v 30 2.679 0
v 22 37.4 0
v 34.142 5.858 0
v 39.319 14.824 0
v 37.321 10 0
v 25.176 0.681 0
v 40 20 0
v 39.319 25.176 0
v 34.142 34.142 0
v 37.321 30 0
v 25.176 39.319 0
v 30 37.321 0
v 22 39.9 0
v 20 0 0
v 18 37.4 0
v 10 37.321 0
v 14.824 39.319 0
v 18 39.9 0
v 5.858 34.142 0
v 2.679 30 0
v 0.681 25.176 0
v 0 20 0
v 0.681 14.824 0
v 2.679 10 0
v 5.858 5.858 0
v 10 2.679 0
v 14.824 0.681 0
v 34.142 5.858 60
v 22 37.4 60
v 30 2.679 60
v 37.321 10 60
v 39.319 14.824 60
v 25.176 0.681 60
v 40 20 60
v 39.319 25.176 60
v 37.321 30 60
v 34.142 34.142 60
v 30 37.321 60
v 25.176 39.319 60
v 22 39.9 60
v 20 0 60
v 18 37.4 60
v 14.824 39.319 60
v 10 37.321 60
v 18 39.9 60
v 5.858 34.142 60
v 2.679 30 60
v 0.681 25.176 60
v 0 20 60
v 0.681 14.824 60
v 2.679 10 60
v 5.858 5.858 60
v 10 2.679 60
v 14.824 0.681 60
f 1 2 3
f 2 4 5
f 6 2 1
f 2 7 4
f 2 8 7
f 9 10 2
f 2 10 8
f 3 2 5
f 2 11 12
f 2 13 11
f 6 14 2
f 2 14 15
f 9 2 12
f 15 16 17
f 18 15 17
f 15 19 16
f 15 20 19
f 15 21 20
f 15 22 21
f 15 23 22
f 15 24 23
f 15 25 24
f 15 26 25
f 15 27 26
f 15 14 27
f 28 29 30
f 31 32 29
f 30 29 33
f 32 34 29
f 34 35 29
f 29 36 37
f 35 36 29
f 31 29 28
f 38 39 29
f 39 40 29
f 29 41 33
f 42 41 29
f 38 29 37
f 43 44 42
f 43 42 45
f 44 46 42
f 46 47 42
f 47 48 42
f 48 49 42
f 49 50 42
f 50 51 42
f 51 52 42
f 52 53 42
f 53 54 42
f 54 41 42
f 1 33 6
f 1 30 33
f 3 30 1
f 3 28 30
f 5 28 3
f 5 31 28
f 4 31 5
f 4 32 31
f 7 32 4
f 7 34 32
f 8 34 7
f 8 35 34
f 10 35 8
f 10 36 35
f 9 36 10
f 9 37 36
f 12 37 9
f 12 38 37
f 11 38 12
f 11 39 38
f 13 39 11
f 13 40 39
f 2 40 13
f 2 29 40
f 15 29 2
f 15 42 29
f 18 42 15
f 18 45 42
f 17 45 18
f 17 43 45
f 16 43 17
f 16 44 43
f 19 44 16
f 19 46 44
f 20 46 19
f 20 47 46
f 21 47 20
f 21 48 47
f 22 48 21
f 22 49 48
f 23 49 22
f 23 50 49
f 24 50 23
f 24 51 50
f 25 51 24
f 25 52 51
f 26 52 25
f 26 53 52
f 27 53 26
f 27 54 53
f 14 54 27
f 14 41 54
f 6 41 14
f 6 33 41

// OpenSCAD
$fn = 32;

// ----------------------------------------------------------------------
// Keyway shaft: d40 shaft, key 4 x 2.5 mm
// ----------------------------------------------------------------------

// --- parameters (mm) ---
shaft_r = 20;             // shaft radius
key_w = 4;                // keyway width
key_d = 2.5;              // keyway depth below the surface line
plate_t = 60;             // shaft length, Z (extrusion height)

shaft_d = 2 * shaft_r;  // shaft diameter
circle_step = 15;  // polygon sampling step, degrees

profile = [[14.824, 39.319], [10, 37.321], [5.858, 34.142], [2.679, 30], [0.681, 25.176], [0, 20], [0.681, 14.824], [2.679, 10], [5.858, 5.858], [10, 2.679], [14.824, 0.681], [20, 0], [25.176, 0.681], [30, 2.679], [34.142, 5.858], [37.321, 10], [39.319, 14.824], [40, 20], [39.319, 25.176], [37.321, 30], [34.142, 34.142], [30, 37.321], [25.176, 39.319], [22, 39.9], [22, 37.4], [18, 37.4], [18, 39.9]];  // primary outline, 27 points, counter clockwise

// --- the one profile operation ---
linear_extrude(height = plate_t) polygon(points = profile);
